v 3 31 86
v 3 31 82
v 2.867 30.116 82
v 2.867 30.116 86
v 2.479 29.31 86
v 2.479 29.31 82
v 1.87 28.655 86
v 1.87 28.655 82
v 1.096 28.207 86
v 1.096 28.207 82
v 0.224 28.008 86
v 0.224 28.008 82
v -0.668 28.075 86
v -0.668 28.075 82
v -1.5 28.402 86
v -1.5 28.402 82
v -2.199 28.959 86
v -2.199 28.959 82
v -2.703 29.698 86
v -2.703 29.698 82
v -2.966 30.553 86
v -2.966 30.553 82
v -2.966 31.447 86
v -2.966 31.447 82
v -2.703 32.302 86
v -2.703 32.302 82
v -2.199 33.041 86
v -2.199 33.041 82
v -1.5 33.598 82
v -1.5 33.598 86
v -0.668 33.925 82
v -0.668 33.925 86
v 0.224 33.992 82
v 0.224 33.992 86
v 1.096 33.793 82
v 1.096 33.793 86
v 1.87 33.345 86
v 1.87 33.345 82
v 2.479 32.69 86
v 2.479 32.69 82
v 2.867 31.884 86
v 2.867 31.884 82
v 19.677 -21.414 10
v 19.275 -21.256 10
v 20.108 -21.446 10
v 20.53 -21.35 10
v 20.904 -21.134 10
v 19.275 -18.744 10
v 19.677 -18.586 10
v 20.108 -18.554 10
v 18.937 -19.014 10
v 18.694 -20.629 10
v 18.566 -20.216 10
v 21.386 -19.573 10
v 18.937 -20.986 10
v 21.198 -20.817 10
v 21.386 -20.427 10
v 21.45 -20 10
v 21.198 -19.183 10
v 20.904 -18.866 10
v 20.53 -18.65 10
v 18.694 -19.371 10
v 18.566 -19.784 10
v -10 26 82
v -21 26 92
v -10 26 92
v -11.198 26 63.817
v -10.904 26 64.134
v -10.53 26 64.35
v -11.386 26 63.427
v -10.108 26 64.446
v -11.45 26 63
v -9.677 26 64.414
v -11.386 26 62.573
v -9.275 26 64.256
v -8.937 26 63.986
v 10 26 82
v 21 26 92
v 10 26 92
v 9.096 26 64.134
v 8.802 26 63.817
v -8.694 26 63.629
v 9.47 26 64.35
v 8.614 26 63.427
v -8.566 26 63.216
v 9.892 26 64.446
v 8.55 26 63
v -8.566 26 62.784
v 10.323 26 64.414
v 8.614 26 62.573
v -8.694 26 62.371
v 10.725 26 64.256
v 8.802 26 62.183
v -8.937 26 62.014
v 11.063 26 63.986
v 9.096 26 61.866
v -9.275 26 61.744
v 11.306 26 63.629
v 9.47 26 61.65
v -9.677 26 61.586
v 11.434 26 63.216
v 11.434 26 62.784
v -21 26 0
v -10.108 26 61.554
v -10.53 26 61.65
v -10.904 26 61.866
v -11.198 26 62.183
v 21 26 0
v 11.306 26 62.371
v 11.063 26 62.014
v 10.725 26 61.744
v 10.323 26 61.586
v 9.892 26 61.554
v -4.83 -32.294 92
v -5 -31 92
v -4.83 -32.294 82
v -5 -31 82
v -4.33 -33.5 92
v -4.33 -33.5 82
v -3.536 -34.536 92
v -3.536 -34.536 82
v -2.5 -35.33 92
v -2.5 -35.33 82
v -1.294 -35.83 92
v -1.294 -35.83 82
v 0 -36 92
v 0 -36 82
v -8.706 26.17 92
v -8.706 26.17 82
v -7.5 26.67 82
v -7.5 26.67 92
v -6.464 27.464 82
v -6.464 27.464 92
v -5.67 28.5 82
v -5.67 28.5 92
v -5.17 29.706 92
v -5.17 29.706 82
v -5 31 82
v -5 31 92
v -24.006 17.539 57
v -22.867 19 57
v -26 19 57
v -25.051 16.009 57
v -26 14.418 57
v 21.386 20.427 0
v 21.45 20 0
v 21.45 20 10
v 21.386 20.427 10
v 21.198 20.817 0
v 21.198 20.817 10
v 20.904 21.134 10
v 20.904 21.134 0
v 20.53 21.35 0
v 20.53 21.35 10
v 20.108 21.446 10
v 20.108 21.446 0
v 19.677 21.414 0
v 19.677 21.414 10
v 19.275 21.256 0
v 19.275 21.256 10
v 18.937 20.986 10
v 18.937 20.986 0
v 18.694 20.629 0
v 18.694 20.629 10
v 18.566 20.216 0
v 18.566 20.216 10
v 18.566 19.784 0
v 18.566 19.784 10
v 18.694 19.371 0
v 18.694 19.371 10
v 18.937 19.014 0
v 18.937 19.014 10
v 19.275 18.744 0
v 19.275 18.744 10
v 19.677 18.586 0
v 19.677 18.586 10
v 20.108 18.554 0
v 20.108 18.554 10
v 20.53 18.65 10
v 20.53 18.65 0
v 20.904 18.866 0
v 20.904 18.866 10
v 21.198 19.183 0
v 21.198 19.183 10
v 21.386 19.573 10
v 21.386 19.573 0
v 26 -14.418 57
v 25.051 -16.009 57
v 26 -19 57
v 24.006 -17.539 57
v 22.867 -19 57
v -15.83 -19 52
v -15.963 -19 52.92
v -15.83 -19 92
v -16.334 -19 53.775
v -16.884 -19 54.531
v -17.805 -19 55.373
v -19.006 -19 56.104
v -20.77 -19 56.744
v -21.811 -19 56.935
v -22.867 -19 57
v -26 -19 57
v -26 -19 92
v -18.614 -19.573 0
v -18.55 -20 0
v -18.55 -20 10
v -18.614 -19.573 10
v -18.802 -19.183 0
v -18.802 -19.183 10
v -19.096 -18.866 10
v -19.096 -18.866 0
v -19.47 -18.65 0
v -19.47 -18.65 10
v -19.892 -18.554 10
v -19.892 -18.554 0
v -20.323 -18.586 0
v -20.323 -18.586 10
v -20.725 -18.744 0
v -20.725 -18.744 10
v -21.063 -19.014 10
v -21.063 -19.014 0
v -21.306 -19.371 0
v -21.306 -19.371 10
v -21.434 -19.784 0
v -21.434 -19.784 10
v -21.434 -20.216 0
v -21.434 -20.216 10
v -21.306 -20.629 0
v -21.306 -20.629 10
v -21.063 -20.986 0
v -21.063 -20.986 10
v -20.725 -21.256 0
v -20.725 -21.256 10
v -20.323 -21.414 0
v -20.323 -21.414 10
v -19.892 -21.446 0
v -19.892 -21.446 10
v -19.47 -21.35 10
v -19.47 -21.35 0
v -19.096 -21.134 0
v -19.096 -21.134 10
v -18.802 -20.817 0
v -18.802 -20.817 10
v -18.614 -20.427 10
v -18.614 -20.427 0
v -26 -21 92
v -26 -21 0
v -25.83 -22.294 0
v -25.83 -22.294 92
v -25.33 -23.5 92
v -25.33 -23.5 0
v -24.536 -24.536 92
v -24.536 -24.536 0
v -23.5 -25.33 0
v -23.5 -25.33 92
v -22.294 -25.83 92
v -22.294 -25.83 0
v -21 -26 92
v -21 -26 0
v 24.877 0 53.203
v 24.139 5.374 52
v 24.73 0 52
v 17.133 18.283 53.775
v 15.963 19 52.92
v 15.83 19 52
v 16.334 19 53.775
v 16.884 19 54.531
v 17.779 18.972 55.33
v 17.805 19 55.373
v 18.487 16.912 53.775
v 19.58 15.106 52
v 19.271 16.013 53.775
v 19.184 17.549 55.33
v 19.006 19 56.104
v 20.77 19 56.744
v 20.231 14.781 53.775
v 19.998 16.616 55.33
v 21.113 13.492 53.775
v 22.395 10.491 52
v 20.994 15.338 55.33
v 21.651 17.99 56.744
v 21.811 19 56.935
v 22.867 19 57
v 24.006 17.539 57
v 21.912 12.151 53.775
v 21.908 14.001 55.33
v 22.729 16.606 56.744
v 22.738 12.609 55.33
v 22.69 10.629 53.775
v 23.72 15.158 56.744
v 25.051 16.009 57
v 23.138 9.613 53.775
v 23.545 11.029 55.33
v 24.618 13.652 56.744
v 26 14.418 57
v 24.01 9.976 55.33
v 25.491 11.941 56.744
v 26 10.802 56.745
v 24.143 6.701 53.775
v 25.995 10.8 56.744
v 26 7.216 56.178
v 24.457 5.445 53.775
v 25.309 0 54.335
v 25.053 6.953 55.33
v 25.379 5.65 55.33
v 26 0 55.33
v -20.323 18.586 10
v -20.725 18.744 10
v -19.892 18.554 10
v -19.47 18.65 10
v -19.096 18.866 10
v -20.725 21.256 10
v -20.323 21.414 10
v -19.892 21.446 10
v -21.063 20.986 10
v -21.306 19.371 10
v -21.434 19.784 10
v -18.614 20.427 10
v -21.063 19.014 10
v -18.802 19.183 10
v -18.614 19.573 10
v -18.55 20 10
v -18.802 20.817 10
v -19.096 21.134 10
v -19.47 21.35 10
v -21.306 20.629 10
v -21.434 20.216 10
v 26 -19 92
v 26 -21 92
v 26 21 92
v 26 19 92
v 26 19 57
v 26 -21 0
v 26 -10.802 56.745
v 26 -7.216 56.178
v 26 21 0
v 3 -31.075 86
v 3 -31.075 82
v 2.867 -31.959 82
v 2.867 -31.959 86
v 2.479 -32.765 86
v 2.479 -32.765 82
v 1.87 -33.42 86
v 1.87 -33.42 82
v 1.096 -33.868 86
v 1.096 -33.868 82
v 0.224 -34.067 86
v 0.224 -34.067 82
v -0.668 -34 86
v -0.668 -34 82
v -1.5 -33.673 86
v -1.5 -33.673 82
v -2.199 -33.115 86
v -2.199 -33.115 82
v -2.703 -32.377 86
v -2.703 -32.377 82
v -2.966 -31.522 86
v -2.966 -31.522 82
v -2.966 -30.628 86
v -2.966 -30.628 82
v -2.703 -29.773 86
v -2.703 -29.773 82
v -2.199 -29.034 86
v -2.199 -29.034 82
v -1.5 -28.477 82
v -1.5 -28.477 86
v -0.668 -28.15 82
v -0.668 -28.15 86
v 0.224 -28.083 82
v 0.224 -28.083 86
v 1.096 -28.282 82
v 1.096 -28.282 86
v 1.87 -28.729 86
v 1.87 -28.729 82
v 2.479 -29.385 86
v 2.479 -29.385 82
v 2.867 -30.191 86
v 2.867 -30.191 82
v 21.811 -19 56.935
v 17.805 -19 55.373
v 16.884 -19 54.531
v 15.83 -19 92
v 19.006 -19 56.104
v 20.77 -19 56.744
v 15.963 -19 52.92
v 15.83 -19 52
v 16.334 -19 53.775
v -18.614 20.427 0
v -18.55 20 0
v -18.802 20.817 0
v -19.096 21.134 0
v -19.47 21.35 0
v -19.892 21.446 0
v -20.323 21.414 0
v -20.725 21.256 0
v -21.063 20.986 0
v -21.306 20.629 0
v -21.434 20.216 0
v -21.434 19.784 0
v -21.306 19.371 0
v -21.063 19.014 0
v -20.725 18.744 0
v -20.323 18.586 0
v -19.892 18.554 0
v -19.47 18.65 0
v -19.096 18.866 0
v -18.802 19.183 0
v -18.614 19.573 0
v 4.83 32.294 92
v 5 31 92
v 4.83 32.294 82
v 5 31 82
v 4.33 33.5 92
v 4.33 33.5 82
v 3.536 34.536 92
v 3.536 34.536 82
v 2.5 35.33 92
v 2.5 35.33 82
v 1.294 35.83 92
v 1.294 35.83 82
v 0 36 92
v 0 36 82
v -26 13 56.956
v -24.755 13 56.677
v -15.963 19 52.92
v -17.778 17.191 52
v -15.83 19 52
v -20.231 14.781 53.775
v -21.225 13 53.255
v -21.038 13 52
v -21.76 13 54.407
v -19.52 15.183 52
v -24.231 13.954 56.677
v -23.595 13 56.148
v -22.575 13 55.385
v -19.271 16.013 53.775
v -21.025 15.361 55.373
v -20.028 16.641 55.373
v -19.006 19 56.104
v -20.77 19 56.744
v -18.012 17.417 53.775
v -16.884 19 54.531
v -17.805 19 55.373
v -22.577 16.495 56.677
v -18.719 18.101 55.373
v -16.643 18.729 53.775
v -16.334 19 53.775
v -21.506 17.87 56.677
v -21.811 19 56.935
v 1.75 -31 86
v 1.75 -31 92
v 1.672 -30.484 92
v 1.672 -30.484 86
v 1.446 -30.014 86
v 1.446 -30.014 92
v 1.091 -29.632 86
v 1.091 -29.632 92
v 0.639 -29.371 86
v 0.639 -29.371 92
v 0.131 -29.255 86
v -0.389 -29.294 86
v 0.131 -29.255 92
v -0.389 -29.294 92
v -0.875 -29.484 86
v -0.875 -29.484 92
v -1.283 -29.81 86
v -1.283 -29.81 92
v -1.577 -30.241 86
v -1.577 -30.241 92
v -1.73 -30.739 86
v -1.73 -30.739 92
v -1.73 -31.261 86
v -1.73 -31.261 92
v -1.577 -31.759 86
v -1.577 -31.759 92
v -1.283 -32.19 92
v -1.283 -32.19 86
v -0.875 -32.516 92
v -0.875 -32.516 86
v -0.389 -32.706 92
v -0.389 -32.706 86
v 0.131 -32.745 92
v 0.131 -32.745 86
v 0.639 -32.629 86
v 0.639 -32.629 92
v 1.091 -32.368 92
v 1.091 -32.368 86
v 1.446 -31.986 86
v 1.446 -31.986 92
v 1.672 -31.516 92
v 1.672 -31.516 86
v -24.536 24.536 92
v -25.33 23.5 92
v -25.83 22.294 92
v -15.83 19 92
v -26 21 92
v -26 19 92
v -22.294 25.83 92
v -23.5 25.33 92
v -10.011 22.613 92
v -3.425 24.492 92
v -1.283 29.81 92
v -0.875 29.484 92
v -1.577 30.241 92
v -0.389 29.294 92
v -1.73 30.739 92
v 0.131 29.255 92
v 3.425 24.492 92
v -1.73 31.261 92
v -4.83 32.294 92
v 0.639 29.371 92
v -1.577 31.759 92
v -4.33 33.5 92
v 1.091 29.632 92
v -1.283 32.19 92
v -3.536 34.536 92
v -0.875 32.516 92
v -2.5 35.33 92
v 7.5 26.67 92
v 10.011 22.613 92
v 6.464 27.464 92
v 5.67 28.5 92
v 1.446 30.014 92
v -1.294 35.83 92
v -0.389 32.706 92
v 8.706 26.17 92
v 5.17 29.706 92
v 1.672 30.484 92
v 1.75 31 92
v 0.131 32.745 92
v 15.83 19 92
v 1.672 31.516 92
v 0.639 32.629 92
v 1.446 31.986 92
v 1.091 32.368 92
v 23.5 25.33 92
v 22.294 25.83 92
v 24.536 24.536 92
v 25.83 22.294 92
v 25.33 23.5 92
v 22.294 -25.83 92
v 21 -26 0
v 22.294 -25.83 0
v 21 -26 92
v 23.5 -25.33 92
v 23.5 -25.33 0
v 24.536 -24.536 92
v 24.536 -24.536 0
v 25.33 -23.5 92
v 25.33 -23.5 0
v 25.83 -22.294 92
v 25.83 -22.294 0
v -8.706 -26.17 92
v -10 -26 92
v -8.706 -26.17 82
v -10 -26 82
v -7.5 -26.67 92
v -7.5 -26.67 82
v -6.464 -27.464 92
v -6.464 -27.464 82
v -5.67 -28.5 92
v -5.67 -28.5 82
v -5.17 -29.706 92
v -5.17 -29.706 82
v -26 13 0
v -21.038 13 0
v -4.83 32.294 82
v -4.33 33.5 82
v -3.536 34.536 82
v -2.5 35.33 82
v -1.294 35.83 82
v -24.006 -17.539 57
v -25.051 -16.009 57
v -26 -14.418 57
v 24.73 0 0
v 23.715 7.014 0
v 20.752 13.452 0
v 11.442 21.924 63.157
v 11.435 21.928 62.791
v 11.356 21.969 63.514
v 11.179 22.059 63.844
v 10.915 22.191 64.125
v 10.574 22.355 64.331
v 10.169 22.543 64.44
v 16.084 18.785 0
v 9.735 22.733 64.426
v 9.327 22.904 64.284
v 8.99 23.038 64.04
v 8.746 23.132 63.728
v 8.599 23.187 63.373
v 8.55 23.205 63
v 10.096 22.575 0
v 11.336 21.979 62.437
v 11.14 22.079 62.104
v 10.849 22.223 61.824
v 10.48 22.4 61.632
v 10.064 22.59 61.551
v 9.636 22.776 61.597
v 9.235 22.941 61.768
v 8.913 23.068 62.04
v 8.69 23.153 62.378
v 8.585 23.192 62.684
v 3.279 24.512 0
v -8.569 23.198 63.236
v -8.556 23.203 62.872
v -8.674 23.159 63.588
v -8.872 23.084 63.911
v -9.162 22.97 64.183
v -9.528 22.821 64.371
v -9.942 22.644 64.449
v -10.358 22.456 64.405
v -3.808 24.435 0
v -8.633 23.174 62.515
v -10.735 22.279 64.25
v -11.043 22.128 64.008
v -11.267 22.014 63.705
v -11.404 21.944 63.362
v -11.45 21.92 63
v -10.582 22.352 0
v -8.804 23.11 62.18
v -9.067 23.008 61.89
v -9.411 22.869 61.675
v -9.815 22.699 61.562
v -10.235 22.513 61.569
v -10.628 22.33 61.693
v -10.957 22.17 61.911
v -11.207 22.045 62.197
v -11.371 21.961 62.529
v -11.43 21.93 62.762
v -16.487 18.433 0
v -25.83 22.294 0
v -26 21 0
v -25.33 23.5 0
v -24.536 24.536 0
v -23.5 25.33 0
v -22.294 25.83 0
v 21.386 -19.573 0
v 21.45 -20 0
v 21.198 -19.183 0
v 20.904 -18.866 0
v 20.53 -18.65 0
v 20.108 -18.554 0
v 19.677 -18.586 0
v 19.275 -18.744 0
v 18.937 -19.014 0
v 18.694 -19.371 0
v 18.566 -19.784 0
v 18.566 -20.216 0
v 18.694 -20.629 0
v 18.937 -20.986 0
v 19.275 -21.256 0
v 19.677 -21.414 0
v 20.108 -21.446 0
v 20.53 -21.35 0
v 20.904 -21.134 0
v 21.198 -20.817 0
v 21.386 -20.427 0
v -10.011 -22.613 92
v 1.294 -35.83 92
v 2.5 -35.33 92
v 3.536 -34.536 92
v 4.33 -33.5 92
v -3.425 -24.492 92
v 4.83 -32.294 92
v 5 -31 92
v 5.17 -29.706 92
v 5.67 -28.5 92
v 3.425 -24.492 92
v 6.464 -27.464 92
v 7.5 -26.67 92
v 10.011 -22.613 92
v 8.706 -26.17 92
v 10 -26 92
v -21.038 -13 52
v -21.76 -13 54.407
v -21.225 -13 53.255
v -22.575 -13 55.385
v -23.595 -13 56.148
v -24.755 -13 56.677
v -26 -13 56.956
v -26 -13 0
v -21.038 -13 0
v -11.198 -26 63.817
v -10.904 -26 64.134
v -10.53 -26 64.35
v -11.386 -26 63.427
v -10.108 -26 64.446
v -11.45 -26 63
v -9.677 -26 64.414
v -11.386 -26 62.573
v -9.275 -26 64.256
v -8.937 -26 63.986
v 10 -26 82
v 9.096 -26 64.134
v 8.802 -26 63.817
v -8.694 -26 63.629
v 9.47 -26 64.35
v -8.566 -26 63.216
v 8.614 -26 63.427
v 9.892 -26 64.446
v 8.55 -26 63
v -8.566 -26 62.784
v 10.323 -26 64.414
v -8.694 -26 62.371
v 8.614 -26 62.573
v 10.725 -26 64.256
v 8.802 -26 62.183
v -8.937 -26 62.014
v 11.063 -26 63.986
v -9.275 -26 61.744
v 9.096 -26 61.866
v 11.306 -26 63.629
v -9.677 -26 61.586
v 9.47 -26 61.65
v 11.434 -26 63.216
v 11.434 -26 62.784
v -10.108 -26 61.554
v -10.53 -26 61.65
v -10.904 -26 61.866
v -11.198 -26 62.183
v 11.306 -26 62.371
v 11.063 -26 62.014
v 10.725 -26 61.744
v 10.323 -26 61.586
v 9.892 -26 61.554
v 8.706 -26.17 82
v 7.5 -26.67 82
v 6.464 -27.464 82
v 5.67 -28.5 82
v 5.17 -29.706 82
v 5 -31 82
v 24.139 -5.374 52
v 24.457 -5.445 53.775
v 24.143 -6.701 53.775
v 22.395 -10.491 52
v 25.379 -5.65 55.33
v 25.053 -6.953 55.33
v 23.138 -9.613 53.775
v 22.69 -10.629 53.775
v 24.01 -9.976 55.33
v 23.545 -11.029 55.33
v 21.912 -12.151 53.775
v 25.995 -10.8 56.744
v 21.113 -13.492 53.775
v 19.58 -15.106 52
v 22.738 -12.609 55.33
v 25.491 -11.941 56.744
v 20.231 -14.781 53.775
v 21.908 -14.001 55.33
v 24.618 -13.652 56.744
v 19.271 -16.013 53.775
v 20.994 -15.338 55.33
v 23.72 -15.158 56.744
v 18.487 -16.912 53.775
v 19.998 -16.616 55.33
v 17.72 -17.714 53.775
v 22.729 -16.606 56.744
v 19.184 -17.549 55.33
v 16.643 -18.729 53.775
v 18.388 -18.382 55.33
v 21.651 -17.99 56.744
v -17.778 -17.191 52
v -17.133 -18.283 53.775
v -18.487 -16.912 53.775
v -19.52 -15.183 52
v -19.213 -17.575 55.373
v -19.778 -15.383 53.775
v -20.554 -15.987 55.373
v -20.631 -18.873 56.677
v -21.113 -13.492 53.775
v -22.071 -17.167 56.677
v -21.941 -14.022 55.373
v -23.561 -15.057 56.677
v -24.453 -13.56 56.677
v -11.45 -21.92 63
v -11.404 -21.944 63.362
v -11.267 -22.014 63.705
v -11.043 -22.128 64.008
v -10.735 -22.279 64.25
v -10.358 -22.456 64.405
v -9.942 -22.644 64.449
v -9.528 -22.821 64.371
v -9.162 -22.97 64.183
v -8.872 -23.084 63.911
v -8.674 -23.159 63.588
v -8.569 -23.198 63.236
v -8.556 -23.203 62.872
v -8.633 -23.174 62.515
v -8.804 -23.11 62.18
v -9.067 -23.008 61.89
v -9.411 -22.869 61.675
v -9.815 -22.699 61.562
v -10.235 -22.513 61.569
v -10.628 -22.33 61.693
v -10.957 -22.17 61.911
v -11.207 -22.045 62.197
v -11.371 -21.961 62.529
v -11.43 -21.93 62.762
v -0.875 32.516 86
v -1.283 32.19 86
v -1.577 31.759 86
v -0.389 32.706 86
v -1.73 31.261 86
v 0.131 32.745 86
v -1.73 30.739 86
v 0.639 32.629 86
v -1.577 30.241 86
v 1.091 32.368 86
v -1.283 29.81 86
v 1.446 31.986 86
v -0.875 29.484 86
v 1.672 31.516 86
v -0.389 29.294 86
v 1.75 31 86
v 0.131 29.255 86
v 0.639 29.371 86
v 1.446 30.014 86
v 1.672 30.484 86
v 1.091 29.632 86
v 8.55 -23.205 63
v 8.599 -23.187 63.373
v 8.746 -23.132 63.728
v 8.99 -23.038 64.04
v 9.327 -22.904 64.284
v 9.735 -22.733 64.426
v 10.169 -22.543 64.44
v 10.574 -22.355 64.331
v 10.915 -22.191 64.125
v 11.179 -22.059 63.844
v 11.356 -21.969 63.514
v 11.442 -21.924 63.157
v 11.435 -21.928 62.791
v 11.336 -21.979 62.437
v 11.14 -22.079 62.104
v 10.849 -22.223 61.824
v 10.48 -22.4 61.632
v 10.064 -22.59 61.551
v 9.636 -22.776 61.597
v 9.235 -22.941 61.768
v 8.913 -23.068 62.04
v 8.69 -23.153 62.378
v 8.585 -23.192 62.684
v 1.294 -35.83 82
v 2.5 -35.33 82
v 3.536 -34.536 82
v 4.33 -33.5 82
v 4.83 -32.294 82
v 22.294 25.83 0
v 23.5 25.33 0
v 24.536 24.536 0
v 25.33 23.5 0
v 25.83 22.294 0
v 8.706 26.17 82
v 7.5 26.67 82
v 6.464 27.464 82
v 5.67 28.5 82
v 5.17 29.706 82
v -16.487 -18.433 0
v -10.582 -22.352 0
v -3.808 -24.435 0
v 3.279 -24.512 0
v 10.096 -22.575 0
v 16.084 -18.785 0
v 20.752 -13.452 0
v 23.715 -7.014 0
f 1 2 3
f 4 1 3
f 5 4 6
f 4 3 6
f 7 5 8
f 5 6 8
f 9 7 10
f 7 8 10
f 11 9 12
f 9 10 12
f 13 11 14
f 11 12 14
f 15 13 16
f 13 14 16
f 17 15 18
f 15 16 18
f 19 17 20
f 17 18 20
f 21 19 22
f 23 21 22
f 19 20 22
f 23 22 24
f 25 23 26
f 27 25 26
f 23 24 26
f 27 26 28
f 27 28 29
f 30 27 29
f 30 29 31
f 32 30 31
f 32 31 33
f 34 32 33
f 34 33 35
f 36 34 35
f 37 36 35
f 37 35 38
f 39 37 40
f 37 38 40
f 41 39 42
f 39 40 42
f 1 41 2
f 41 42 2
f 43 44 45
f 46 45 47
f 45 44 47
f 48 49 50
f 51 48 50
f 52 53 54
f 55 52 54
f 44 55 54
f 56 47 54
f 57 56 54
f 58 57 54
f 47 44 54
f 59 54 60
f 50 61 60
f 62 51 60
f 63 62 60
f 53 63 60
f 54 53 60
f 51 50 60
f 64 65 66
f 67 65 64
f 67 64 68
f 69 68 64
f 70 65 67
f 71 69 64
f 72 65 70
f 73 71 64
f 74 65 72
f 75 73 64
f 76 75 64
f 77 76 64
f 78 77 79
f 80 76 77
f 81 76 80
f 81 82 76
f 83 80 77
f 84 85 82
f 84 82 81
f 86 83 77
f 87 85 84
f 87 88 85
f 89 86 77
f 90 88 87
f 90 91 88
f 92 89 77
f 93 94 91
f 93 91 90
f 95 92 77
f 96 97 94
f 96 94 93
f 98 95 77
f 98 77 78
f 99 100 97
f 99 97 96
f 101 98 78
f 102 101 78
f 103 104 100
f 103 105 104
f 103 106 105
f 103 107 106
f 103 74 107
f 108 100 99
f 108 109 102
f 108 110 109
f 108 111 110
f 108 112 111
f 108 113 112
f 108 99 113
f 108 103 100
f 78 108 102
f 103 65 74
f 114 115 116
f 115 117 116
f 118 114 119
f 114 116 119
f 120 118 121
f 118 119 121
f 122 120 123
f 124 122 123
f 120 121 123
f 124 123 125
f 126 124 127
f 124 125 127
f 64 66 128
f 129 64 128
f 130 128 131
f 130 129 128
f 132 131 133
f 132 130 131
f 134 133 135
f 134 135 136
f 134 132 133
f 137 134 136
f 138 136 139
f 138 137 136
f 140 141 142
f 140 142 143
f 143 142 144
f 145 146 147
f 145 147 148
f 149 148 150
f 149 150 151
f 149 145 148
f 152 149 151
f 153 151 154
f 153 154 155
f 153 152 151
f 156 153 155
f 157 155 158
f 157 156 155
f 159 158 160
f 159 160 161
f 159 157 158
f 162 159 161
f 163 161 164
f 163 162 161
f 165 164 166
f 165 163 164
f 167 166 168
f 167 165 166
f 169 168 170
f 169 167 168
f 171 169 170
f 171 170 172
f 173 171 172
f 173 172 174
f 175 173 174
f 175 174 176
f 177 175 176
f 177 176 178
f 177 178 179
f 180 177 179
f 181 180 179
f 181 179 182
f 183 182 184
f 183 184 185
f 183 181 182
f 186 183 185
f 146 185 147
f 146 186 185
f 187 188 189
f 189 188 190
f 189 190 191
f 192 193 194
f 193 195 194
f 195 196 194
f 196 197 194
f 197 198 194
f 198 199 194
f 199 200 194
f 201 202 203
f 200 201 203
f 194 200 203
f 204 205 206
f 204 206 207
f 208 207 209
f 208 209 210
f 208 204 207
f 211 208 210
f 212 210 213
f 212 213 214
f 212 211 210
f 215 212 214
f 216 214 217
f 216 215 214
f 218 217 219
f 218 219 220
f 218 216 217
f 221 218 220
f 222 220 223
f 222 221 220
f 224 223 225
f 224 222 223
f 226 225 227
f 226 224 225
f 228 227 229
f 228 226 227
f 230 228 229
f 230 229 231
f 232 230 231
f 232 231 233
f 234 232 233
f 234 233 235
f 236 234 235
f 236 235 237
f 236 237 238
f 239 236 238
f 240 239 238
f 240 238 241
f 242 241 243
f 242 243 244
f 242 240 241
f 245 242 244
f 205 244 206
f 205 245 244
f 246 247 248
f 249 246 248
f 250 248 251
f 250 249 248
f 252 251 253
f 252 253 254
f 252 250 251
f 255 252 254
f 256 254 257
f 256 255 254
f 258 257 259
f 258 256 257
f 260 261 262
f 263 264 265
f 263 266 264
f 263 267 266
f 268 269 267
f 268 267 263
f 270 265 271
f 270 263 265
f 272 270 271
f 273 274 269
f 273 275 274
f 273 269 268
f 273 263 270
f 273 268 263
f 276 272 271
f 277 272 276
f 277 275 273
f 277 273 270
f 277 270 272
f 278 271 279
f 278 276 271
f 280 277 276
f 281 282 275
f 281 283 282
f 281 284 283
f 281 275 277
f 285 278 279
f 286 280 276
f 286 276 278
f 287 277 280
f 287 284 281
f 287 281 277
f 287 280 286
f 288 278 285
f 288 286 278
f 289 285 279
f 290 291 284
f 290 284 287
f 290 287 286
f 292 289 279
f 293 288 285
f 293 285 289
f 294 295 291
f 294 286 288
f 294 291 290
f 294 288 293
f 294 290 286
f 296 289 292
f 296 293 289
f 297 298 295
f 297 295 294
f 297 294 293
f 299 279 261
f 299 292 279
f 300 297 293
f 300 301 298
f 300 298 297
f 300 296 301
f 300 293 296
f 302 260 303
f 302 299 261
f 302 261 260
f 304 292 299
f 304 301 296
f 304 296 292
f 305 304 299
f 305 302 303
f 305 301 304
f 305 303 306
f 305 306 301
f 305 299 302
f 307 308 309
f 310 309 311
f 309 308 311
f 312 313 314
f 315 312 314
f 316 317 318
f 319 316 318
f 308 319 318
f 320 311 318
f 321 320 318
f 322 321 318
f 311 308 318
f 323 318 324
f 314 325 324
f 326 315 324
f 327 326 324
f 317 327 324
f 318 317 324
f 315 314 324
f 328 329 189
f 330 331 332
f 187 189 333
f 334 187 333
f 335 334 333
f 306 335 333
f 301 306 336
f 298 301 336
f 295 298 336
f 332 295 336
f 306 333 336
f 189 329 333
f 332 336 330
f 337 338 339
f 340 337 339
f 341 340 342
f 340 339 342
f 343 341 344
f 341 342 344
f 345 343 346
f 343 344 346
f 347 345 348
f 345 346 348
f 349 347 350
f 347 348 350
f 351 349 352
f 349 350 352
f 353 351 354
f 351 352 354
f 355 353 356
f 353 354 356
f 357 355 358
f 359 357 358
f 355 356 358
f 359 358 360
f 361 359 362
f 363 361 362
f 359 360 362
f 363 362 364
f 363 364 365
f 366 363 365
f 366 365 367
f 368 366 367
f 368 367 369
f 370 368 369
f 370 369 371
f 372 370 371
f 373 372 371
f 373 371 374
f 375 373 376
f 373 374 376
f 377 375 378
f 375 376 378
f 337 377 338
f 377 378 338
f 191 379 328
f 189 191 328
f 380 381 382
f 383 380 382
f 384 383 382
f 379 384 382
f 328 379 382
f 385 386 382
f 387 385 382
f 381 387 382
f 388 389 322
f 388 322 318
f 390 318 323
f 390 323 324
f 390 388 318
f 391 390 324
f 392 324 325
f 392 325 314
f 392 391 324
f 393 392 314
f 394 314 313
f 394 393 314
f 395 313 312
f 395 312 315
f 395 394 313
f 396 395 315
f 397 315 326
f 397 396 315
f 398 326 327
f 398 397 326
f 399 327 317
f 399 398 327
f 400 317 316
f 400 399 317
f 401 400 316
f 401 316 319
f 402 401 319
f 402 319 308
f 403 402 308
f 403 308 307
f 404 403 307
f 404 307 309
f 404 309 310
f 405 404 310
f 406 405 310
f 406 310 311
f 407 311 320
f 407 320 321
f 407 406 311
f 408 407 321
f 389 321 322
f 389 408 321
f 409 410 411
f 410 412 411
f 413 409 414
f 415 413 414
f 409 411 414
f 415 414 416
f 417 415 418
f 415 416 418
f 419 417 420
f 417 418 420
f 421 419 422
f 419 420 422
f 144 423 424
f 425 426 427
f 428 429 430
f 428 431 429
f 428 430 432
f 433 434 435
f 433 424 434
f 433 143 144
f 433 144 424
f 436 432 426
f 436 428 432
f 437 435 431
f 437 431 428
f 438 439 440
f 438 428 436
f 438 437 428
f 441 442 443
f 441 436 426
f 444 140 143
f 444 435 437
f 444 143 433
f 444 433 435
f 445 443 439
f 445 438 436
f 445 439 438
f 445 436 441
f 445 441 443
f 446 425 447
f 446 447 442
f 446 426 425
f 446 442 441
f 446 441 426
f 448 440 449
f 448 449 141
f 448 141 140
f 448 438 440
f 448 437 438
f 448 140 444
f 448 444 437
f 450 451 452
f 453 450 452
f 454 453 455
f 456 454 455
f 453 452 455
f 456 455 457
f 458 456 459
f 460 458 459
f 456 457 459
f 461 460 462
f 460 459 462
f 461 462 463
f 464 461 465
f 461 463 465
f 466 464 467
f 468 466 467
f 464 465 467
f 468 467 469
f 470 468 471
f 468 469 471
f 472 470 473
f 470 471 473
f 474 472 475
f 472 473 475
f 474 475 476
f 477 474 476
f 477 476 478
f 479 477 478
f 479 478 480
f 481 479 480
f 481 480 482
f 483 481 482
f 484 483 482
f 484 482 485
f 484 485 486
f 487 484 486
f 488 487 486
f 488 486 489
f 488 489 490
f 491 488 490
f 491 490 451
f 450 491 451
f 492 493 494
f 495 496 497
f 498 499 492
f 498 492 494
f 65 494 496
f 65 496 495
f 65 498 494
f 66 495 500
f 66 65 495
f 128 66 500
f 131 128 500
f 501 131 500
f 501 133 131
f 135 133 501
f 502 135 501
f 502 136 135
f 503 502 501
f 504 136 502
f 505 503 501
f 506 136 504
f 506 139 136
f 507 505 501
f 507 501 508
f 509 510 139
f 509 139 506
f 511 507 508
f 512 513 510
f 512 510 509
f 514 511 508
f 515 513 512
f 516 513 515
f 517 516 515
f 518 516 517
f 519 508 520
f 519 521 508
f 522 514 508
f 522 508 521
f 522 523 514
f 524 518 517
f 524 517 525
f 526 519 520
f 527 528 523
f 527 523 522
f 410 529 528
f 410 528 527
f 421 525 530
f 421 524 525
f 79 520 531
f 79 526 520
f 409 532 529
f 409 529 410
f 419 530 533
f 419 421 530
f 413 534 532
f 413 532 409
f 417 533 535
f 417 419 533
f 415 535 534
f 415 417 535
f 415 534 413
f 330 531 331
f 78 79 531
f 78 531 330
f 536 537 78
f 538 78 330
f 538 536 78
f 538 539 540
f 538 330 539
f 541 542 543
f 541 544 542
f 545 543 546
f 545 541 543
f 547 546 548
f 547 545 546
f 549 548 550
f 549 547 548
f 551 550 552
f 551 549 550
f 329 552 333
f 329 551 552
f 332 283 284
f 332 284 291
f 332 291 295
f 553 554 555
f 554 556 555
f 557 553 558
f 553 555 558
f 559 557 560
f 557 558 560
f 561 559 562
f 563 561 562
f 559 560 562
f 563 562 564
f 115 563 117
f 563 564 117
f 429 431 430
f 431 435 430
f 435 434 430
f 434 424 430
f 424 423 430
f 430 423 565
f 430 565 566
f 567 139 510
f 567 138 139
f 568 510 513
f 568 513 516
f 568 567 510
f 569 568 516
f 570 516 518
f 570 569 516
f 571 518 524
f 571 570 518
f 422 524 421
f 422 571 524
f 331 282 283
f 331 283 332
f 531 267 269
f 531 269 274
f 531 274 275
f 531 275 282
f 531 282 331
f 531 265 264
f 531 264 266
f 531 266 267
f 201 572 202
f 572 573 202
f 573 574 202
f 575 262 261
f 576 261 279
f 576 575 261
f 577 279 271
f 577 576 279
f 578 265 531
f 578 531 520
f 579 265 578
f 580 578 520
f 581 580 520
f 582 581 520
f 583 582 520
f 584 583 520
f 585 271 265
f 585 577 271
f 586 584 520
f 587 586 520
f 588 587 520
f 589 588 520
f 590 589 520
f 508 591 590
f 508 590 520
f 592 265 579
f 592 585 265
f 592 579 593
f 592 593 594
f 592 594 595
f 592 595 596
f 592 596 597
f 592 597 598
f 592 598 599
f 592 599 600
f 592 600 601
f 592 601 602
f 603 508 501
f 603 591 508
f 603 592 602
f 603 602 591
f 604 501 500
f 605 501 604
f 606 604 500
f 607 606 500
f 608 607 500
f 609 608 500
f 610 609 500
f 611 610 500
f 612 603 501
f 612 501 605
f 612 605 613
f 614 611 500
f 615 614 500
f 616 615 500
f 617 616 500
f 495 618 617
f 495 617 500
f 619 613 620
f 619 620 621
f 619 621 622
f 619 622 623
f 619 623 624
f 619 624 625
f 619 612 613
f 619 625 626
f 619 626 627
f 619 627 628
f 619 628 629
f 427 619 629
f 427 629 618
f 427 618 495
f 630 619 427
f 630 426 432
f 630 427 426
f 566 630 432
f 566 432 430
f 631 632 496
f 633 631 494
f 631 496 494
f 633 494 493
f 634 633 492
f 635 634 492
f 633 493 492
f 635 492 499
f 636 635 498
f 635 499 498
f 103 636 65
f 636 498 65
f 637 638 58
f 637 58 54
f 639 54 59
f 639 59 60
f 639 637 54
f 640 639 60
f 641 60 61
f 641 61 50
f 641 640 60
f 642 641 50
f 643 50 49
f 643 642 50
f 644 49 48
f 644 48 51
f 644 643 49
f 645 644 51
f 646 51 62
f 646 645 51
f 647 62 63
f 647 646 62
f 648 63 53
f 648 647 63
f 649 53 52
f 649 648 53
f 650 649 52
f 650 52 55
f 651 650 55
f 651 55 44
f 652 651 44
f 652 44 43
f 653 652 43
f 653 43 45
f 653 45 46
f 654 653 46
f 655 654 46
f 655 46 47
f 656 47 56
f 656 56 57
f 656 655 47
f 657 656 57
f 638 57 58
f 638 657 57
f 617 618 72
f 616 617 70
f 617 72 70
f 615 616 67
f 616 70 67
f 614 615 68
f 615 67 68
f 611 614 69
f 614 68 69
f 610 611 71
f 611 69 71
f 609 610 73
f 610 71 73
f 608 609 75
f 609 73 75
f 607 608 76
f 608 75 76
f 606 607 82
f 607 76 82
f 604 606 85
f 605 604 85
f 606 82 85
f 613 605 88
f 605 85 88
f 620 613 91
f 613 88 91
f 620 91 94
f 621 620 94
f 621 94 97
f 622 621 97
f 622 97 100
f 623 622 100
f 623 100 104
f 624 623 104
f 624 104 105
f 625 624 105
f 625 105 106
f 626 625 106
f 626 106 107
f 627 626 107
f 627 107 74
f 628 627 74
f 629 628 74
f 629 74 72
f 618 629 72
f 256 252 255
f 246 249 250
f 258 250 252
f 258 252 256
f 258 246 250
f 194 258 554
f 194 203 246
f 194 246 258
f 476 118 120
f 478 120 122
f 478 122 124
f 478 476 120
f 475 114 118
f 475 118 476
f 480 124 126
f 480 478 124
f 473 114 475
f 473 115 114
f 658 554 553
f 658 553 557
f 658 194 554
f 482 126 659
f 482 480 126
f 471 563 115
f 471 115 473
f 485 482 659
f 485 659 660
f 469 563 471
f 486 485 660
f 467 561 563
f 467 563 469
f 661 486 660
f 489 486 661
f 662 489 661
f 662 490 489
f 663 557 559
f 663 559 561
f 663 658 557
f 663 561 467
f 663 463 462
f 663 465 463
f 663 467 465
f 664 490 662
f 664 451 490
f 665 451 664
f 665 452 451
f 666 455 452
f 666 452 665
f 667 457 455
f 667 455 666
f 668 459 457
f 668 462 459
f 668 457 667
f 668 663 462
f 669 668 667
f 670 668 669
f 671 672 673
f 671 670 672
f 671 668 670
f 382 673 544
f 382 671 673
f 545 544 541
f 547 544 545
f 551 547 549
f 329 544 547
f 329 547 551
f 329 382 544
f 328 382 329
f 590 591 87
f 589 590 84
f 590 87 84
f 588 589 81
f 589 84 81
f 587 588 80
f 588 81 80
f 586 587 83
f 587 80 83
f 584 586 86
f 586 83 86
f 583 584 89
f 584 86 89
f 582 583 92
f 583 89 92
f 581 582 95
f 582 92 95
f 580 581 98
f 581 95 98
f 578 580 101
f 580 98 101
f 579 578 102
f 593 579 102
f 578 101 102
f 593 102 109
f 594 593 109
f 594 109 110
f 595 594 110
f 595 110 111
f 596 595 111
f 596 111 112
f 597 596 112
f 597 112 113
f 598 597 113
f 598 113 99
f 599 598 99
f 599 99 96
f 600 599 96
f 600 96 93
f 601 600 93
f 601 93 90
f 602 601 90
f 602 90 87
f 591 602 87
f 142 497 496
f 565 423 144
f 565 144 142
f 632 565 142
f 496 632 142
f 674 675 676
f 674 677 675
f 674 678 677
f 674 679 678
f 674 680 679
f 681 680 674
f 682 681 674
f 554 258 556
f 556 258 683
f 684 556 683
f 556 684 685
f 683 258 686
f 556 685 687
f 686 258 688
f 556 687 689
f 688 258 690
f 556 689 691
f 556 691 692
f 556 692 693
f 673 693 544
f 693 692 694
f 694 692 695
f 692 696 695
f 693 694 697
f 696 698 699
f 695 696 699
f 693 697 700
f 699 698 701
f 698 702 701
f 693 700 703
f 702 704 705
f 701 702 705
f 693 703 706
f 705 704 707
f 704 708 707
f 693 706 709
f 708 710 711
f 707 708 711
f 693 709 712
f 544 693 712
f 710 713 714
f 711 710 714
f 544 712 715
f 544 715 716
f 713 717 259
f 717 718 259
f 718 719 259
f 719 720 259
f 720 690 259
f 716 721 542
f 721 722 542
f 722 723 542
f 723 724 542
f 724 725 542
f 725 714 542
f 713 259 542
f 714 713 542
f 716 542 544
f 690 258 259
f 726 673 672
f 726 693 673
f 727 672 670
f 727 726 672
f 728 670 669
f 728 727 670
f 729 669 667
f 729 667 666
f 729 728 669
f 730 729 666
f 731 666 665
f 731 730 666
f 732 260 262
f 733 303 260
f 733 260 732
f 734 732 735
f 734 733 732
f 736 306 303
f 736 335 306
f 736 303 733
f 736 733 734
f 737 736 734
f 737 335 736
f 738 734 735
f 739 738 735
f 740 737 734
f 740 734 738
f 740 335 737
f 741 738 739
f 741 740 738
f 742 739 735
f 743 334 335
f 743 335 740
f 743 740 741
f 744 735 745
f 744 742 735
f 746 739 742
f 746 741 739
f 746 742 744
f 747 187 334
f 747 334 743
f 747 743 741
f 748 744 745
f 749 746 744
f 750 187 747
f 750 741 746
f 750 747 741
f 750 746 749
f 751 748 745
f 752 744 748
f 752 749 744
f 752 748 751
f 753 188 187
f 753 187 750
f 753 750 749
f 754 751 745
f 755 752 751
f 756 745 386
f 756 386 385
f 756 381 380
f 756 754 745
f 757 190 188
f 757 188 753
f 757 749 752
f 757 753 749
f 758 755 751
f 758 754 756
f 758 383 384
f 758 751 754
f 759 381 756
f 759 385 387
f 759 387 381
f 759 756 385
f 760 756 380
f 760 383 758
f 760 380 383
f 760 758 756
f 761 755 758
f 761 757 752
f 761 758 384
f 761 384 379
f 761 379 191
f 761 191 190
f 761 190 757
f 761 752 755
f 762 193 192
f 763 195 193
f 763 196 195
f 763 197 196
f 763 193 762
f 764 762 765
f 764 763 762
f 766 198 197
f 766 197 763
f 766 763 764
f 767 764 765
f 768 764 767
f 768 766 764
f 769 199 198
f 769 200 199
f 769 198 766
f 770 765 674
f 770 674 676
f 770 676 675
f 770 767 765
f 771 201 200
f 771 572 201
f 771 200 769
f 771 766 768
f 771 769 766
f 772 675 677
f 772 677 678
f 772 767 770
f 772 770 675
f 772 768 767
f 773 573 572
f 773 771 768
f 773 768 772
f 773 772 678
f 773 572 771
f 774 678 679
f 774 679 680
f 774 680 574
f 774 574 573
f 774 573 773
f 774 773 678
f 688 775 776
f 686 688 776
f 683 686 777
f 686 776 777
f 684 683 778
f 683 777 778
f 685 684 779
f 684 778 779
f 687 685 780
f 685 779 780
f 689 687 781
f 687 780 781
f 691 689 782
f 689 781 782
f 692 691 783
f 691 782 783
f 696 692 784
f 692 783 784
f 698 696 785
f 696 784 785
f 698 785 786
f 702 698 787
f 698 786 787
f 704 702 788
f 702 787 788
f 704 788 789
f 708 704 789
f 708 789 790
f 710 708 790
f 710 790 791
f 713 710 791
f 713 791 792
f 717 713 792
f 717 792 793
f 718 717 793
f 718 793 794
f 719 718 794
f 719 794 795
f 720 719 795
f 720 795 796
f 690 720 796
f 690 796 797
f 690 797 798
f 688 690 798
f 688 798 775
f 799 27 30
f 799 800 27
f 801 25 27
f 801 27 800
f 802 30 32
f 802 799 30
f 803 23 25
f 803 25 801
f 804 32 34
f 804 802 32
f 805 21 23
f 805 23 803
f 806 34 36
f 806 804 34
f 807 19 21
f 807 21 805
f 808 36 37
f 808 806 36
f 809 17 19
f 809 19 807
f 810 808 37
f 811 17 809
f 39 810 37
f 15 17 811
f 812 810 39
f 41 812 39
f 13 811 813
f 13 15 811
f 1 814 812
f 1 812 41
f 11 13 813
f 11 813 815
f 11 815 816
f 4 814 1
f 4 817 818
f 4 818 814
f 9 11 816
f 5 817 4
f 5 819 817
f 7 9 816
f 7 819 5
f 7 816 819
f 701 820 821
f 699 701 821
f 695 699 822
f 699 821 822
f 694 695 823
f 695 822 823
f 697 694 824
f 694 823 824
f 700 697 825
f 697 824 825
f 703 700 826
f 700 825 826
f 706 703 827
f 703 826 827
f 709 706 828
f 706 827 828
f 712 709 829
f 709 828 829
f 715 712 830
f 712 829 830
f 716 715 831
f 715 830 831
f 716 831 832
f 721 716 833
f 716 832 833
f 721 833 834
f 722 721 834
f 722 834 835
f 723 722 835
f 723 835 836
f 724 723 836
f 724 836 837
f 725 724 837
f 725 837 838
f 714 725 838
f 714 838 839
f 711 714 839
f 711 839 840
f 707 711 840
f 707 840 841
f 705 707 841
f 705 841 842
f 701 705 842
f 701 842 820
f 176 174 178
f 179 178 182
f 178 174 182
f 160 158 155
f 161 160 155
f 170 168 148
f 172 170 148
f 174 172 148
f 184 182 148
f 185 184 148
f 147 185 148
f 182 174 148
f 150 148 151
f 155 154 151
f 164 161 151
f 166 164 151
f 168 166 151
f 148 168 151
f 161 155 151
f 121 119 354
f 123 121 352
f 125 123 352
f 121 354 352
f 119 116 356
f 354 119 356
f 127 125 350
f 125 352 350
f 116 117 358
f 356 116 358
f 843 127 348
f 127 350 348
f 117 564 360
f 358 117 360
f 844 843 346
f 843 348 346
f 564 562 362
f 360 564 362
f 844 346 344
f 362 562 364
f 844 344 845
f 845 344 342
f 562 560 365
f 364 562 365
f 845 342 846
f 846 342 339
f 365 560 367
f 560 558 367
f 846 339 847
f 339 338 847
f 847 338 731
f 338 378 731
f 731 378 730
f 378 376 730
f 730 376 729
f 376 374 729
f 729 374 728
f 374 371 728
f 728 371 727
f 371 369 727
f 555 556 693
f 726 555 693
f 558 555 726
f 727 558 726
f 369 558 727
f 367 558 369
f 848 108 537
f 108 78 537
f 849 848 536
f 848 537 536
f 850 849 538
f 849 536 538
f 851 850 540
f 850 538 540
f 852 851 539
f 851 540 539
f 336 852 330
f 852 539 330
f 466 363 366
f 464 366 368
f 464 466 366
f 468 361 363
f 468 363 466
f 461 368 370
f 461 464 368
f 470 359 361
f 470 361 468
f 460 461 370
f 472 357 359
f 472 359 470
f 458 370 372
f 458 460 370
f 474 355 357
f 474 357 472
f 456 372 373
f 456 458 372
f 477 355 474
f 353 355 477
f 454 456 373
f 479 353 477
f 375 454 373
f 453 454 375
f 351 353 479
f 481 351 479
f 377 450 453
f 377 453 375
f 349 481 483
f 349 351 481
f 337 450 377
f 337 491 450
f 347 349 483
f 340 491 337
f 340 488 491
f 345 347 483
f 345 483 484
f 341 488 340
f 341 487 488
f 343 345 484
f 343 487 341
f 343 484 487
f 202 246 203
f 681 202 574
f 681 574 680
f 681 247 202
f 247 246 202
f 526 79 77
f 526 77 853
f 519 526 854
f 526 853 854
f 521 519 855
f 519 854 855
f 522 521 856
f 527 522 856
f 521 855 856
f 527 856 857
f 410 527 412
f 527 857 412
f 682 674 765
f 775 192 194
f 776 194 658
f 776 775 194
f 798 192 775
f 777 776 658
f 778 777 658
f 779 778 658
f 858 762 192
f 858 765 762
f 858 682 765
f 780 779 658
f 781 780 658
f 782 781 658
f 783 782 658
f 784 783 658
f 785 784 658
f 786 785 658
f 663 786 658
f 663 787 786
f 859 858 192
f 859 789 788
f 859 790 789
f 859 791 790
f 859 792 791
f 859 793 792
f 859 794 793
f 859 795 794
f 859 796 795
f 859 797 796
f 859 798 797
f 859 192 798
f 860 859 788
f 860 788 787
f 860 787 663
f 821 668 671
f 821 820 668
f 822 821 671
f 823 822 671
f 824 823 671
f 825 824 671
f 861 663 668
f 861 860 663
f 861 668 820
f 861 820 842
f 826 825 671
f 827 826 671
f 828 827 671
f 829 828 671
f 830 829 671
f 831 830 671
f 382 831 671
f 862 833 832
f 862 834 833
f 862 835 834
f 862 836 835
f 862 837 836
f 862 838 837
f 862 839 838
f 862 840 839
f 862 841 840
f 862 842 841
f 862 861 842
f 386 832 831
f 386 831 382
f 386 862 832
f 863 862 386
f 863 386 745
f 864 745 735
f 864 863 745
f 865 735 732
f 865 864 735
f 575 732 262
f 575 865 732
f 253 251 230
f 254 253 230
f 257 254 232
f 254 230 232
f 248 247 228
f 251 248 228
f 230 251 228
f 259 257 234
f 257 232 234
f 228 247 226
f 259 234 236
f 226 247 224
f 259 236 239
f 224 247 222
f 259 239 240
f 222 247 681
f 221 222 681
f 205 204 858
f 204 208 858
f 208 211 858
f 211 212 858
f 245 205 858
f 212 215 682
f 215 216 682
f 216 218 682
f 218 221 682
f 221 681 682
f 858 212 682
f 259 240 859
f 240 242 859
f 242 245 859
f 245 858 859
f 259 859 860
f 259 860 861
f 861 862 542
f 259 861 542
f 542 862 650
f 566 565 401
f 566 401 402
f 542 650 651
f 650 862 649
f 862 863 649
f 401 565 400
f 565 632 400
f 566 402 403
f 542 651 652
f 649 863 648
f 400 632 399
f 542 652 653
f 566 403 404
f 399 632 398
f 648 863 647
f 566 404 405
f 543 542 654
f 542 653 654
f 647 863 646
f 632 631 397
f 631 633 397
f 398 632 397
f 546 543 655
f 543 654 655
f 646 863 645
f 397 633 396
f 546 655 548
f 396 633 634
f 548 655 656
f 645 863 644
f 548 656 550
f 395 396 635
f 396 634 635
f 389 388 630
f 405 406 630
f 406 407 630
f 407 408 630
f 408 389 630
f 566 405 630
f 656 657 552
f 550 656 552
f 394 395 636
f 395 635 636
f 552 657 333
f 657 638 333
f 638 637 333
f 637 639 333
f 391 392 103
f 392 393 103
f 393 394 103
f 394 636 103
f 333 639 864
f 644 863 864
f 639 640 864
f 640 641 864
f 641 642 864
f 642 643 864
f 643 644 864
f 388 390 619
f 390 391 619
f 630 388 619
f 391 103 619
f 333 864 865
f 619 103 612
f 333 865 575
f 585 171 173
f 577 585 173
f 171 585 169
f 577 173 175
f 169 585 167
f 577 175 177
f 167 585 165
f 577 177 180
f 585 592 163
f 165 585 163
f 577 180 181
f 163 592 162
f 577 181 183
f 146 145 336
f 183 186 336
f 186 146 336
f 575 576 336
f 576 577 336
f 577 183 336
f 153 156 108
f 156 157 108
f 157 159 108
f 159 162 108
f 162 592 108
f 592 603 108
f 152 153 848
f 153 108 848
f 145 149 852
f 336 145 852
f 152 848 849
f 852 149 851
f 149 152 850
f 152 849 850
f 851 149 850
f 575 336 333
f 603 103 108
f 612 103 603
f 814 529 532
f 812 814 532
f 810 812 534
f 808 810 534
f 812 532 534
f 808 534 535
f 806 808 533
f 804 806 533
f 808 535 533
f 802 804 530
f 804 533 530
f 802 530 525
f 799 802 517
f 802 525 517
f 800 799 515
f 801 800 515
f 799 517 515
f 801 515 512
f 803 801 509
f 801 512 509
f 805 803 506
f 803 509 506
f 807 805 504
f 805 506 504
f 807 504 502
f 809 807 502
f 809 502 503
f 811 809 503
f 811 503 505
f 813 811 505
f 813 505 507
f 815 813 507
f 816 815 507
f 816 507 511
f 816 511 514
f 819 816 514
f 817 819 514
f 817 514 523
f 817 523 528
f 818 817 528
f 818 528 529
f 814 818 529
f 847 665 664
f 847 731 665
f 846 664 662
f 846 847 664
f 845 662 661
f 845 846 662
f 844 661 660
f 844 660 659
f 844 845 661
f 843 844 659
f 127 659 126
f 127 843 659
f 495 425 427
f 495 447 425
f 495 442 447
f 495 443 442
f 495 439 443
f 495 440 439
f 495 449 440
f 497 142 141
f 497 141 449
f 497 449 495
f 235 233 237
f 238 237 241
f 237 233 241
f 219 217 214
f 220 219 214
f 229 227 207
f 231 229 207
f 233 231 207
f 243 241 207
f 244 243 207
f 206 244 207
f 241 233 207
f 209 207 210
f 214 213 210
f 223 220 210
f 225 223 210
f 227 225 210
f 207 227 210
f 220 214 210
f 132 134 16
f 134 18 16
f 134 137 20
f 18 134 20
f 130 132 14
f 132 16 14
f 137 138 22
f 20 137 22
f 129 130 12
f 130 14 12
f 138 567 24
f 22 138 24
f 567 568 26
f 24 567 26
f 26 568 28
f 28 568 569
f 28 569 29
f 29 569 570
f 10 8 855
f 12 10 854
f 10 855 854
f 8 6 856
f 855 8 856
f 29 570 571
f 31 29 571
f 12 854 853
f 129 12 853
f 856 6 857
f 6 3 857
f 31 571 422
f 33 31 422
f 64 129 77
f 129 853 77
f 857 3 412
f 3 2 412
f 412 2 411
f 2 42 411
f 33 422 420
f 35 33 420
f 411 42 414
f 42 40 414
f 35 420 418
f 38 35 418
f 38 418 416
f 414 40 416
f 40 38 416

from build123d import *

# Parameters (mm, degrees)
F0_W         = 52
F0_H         = 52
F0_R         = 24.7301056407
F1_DEPTH     = 92
F2_W         = 38
F2_H         = 35
F3_DEPTH     = 52.001
F4_R         = 5
F5_T4_ANGLE  = 79.1651275765
F5_T9_ANGLE  = 158.3519759407
F5_T15_ANGLE = 79.1651275765
F6_R         = 1.45
F7_DEPTH     = 10
F8_R         = 1.45
F9_DEPTH     = 52.001
F10_W        = 25
F10_H        = 26
F11_DEPTH    = 92.0010001
F12_W        = 10
F12_H        = 10
F12_R        = 1.75
F13_DEPTH    = 10
F14_R        = 4.99999
F15_R        = 3
F16_DEPTH    = 4


# Not quite as in the source:
# - a fillet or chamfer that OpenCascade refuses, or shapes differently, is made with other operations: its cross-section is extruded or revolved along the edge and cut away or added
# - a fillet or chamfer is up to 0.001 mm smaller than in the source, because OpenCascade refuses the exact size


with BuildPart() as f1:
    # F0 (on Top) → F1 (new body)
    with BuildSketch(Plane.XY):
        Rectangle(F0_W, F0_H)
        Circle(F0_R, mode=Mode.SUBTRACT)
    extrude(amount=F1_DEPTH)

    # F2 (on face) → F3 (cut, through all)
    with BuildSketch(Plane(origin=(-26, 0, 0), x_dir=(0, -1, 0), z_dir=(-1, 0, 0))):
        with Locations((0, 74.5)):
            Rectangle(F2_W, F2_H)
    extrude(amount=-F3_DEPTH, mode=Mode.SUBTRACT)

    # F4
    f4_edges = [f1.edges().sort_by_distance(p)[0] for p in [
        (-26, 26, 46),
        (-26, -26, 46),
        (26, 26, 46),
        (26, -26, 46),
    ]]
    fillet(f4_edges, radius=F4_R)

    # F5: fillet of radius 5 on 3 edges, made by hand


with BuildPart() as f5_tool2:
    # F5_s3 → F5_t4 (revolve)
    with BuildSketch(Plane.XZ):
        with BuildLine():
            ThreePointArc((24.7301056407, 52), (26.1945717348, 55.5355339059), (29.7301056407, 57))
            Line((29.7301056407, 57), (24.7301056407, 57))
            Line((24.7301056407, 57), (24.7301056407, 52))
        make_face()
    revolve(axis=Axis((0, 0, 57), (0, 0, -1)), revolution_arc=F5_T4_ANGLE)

    split(bisect_by=Plane.XZ.offset(19), keep=Keep.BOTTOM)


with BuildPart() as f1_1:
    add(f1.part)

    # F5_t1: cut F5_tool2
    add(f5_tool2.part, mode=Mode.SUBTRACT)


with BuildPart() as f5_tool7:
    # F5_s8 → F5_t9 (revolve)
    with BuildSketch(Plane(origin=(0, 0, 0), x_dir=(0, 0, 1), z_dir=(0.982208635, -0.1877929639, 0))):
        with BuildLine():
            ThreePointArc((52, 24.7301056407), (55.5355339059, 26.1945717348), (57, 29.7301056407))
            Line((57, 29.7301056407), (57, 24.7301056407))
            Line((57, 24.7301056407), (52, 24.7301056407))
        make_face()
    revolve(axis=Axis((0, 0, 57), (0, 0, -1)), revolution_arc=F5_T9_ANGLE)

    split(bisect_by=Plane.XZ.offset(-19), keep=Keep.TOP)

    split(bisect_by=Plane.XZ.offset(19), keep=Keep.BOTTOM)


with BuildPart() as f1_2:
    add(f1_1.part)

    # F5_t6: cut F5_tool7
    add(f5_tool7.part, mode=Mode.SUBTRACT)


with BuildPart() as f5_tool13:
    # F5_s14 → F5_t15 (revolve)
    with BuildSketch(Plane(origin=(0, 0, 0), x_dir=(0, 0, 1), z_dir=(-0.9821730213, 0.1879791378, 0))):
        with BuildLine():
            ThreePointArc((52, 24.7301056407), (55.5355339059, 26.1945717348), (57, 29.7301056407))
            Line((57, 29.7301056407), (57, 24.7301056407))
            Line((57, 24.7301056407), (52, 24.7301056407))
        make_face()
    revolve(axis=Axis((0, 0, 57), (0, 0, -1)), revolution_arc=F5_T15_ANGLE)

    split(bisect_by=Plane.XZ.offset(-19), keep=Keep.TOP)


with BuildPart() as f1_3:
    add(f1_2.part)

    # F5_t12: cut F5_tool13
    add(f5_tool13.part, mode=Mode.SUBTRACT)

    # F6 (on face) → F7 (cut)
    with BuildSketch(Plane.XY):
        with Locations((-20, -20)):
            Circle(F6_R)
        with Locations((20, -20)):
            Circle(F6_R)
        with Locations((20, 20)):
            Circle(F6_R)
        with Locations((-20, 20)):
            Circle(F6_R)
    extrude(amount=F7_DEPTH, mode=Mode.SUBTRACT)

    # F8 (on face) → F9 (cut, through all)
    with BuildSketch(Plane(origin=(0, 26, 0), x_dir=(-1, 0, 0), z_dir=(0, 1, 0))):
        with Locations((-10, 63)):
            Circle(F8_R)
        with Locations((10, 63)):
            Circle(F8_R)
    extrude(amount=-F9_DEPTH, mode=Mode.SUBTRACT)

    # F10 (on face) → F11 (cut, through all)
    with BuildSketch(Plane.XY):
        with Locations((-28.625, 0)):
            Rectangle(F10_W, F10_H)
    extrude(amount=F11_DEPTH, mode=Mode.SUBTRACT)

    # F12 (on face) → F13 (join)
    with BuildSketch(Plane.XY.offset(92)):
        with Locations((0, -31)):
            Rectangle(F12_W, F12_H)
        with Locations((0, -31)):
            Circle(F12_R, mode=Mode.SUBTRACT)
        with Locations((0, 31)):
            Rectangle(F12_W, F12_H)
        with Locations((0, 31)):
            Circle(F12_R, mode=Mode.SUBTRACT)
    extrude(amount=-F13_DEPTH)

    # F14 (radius 5 in the source; OpenCascade refuses exactly that, so slightly less here)
    f14_edges = [f1_3.edges().sort_by_distance(p)[0] for p in [
        (-5, -26, 87),
        (5, -26, 87),
        (-5, 26, 87),
        (5, 26, 87),
        (5, 36, 87),
        (-5, 36, 87),
        (-5, -36, 87),
        (5, -36, 87),
    ]]
    fillet(f14_edges, radius=F14_R)

    # F15 (on face) → F16 (cut)
    with BuildSketch(Plane(origin=(0, 0, 82), x_dir=(1, 0, 0), z_dir=(0, 0, -1))):
        with Locations((0, 31.0749467462)):
            Circle(F15_R)
        with Locations((0, -31)):
            Circle(F15_R)
    extrude(amount=-F16_DEPTH, mode=Mode.SUBTRACT)


solid = f1_3.part
